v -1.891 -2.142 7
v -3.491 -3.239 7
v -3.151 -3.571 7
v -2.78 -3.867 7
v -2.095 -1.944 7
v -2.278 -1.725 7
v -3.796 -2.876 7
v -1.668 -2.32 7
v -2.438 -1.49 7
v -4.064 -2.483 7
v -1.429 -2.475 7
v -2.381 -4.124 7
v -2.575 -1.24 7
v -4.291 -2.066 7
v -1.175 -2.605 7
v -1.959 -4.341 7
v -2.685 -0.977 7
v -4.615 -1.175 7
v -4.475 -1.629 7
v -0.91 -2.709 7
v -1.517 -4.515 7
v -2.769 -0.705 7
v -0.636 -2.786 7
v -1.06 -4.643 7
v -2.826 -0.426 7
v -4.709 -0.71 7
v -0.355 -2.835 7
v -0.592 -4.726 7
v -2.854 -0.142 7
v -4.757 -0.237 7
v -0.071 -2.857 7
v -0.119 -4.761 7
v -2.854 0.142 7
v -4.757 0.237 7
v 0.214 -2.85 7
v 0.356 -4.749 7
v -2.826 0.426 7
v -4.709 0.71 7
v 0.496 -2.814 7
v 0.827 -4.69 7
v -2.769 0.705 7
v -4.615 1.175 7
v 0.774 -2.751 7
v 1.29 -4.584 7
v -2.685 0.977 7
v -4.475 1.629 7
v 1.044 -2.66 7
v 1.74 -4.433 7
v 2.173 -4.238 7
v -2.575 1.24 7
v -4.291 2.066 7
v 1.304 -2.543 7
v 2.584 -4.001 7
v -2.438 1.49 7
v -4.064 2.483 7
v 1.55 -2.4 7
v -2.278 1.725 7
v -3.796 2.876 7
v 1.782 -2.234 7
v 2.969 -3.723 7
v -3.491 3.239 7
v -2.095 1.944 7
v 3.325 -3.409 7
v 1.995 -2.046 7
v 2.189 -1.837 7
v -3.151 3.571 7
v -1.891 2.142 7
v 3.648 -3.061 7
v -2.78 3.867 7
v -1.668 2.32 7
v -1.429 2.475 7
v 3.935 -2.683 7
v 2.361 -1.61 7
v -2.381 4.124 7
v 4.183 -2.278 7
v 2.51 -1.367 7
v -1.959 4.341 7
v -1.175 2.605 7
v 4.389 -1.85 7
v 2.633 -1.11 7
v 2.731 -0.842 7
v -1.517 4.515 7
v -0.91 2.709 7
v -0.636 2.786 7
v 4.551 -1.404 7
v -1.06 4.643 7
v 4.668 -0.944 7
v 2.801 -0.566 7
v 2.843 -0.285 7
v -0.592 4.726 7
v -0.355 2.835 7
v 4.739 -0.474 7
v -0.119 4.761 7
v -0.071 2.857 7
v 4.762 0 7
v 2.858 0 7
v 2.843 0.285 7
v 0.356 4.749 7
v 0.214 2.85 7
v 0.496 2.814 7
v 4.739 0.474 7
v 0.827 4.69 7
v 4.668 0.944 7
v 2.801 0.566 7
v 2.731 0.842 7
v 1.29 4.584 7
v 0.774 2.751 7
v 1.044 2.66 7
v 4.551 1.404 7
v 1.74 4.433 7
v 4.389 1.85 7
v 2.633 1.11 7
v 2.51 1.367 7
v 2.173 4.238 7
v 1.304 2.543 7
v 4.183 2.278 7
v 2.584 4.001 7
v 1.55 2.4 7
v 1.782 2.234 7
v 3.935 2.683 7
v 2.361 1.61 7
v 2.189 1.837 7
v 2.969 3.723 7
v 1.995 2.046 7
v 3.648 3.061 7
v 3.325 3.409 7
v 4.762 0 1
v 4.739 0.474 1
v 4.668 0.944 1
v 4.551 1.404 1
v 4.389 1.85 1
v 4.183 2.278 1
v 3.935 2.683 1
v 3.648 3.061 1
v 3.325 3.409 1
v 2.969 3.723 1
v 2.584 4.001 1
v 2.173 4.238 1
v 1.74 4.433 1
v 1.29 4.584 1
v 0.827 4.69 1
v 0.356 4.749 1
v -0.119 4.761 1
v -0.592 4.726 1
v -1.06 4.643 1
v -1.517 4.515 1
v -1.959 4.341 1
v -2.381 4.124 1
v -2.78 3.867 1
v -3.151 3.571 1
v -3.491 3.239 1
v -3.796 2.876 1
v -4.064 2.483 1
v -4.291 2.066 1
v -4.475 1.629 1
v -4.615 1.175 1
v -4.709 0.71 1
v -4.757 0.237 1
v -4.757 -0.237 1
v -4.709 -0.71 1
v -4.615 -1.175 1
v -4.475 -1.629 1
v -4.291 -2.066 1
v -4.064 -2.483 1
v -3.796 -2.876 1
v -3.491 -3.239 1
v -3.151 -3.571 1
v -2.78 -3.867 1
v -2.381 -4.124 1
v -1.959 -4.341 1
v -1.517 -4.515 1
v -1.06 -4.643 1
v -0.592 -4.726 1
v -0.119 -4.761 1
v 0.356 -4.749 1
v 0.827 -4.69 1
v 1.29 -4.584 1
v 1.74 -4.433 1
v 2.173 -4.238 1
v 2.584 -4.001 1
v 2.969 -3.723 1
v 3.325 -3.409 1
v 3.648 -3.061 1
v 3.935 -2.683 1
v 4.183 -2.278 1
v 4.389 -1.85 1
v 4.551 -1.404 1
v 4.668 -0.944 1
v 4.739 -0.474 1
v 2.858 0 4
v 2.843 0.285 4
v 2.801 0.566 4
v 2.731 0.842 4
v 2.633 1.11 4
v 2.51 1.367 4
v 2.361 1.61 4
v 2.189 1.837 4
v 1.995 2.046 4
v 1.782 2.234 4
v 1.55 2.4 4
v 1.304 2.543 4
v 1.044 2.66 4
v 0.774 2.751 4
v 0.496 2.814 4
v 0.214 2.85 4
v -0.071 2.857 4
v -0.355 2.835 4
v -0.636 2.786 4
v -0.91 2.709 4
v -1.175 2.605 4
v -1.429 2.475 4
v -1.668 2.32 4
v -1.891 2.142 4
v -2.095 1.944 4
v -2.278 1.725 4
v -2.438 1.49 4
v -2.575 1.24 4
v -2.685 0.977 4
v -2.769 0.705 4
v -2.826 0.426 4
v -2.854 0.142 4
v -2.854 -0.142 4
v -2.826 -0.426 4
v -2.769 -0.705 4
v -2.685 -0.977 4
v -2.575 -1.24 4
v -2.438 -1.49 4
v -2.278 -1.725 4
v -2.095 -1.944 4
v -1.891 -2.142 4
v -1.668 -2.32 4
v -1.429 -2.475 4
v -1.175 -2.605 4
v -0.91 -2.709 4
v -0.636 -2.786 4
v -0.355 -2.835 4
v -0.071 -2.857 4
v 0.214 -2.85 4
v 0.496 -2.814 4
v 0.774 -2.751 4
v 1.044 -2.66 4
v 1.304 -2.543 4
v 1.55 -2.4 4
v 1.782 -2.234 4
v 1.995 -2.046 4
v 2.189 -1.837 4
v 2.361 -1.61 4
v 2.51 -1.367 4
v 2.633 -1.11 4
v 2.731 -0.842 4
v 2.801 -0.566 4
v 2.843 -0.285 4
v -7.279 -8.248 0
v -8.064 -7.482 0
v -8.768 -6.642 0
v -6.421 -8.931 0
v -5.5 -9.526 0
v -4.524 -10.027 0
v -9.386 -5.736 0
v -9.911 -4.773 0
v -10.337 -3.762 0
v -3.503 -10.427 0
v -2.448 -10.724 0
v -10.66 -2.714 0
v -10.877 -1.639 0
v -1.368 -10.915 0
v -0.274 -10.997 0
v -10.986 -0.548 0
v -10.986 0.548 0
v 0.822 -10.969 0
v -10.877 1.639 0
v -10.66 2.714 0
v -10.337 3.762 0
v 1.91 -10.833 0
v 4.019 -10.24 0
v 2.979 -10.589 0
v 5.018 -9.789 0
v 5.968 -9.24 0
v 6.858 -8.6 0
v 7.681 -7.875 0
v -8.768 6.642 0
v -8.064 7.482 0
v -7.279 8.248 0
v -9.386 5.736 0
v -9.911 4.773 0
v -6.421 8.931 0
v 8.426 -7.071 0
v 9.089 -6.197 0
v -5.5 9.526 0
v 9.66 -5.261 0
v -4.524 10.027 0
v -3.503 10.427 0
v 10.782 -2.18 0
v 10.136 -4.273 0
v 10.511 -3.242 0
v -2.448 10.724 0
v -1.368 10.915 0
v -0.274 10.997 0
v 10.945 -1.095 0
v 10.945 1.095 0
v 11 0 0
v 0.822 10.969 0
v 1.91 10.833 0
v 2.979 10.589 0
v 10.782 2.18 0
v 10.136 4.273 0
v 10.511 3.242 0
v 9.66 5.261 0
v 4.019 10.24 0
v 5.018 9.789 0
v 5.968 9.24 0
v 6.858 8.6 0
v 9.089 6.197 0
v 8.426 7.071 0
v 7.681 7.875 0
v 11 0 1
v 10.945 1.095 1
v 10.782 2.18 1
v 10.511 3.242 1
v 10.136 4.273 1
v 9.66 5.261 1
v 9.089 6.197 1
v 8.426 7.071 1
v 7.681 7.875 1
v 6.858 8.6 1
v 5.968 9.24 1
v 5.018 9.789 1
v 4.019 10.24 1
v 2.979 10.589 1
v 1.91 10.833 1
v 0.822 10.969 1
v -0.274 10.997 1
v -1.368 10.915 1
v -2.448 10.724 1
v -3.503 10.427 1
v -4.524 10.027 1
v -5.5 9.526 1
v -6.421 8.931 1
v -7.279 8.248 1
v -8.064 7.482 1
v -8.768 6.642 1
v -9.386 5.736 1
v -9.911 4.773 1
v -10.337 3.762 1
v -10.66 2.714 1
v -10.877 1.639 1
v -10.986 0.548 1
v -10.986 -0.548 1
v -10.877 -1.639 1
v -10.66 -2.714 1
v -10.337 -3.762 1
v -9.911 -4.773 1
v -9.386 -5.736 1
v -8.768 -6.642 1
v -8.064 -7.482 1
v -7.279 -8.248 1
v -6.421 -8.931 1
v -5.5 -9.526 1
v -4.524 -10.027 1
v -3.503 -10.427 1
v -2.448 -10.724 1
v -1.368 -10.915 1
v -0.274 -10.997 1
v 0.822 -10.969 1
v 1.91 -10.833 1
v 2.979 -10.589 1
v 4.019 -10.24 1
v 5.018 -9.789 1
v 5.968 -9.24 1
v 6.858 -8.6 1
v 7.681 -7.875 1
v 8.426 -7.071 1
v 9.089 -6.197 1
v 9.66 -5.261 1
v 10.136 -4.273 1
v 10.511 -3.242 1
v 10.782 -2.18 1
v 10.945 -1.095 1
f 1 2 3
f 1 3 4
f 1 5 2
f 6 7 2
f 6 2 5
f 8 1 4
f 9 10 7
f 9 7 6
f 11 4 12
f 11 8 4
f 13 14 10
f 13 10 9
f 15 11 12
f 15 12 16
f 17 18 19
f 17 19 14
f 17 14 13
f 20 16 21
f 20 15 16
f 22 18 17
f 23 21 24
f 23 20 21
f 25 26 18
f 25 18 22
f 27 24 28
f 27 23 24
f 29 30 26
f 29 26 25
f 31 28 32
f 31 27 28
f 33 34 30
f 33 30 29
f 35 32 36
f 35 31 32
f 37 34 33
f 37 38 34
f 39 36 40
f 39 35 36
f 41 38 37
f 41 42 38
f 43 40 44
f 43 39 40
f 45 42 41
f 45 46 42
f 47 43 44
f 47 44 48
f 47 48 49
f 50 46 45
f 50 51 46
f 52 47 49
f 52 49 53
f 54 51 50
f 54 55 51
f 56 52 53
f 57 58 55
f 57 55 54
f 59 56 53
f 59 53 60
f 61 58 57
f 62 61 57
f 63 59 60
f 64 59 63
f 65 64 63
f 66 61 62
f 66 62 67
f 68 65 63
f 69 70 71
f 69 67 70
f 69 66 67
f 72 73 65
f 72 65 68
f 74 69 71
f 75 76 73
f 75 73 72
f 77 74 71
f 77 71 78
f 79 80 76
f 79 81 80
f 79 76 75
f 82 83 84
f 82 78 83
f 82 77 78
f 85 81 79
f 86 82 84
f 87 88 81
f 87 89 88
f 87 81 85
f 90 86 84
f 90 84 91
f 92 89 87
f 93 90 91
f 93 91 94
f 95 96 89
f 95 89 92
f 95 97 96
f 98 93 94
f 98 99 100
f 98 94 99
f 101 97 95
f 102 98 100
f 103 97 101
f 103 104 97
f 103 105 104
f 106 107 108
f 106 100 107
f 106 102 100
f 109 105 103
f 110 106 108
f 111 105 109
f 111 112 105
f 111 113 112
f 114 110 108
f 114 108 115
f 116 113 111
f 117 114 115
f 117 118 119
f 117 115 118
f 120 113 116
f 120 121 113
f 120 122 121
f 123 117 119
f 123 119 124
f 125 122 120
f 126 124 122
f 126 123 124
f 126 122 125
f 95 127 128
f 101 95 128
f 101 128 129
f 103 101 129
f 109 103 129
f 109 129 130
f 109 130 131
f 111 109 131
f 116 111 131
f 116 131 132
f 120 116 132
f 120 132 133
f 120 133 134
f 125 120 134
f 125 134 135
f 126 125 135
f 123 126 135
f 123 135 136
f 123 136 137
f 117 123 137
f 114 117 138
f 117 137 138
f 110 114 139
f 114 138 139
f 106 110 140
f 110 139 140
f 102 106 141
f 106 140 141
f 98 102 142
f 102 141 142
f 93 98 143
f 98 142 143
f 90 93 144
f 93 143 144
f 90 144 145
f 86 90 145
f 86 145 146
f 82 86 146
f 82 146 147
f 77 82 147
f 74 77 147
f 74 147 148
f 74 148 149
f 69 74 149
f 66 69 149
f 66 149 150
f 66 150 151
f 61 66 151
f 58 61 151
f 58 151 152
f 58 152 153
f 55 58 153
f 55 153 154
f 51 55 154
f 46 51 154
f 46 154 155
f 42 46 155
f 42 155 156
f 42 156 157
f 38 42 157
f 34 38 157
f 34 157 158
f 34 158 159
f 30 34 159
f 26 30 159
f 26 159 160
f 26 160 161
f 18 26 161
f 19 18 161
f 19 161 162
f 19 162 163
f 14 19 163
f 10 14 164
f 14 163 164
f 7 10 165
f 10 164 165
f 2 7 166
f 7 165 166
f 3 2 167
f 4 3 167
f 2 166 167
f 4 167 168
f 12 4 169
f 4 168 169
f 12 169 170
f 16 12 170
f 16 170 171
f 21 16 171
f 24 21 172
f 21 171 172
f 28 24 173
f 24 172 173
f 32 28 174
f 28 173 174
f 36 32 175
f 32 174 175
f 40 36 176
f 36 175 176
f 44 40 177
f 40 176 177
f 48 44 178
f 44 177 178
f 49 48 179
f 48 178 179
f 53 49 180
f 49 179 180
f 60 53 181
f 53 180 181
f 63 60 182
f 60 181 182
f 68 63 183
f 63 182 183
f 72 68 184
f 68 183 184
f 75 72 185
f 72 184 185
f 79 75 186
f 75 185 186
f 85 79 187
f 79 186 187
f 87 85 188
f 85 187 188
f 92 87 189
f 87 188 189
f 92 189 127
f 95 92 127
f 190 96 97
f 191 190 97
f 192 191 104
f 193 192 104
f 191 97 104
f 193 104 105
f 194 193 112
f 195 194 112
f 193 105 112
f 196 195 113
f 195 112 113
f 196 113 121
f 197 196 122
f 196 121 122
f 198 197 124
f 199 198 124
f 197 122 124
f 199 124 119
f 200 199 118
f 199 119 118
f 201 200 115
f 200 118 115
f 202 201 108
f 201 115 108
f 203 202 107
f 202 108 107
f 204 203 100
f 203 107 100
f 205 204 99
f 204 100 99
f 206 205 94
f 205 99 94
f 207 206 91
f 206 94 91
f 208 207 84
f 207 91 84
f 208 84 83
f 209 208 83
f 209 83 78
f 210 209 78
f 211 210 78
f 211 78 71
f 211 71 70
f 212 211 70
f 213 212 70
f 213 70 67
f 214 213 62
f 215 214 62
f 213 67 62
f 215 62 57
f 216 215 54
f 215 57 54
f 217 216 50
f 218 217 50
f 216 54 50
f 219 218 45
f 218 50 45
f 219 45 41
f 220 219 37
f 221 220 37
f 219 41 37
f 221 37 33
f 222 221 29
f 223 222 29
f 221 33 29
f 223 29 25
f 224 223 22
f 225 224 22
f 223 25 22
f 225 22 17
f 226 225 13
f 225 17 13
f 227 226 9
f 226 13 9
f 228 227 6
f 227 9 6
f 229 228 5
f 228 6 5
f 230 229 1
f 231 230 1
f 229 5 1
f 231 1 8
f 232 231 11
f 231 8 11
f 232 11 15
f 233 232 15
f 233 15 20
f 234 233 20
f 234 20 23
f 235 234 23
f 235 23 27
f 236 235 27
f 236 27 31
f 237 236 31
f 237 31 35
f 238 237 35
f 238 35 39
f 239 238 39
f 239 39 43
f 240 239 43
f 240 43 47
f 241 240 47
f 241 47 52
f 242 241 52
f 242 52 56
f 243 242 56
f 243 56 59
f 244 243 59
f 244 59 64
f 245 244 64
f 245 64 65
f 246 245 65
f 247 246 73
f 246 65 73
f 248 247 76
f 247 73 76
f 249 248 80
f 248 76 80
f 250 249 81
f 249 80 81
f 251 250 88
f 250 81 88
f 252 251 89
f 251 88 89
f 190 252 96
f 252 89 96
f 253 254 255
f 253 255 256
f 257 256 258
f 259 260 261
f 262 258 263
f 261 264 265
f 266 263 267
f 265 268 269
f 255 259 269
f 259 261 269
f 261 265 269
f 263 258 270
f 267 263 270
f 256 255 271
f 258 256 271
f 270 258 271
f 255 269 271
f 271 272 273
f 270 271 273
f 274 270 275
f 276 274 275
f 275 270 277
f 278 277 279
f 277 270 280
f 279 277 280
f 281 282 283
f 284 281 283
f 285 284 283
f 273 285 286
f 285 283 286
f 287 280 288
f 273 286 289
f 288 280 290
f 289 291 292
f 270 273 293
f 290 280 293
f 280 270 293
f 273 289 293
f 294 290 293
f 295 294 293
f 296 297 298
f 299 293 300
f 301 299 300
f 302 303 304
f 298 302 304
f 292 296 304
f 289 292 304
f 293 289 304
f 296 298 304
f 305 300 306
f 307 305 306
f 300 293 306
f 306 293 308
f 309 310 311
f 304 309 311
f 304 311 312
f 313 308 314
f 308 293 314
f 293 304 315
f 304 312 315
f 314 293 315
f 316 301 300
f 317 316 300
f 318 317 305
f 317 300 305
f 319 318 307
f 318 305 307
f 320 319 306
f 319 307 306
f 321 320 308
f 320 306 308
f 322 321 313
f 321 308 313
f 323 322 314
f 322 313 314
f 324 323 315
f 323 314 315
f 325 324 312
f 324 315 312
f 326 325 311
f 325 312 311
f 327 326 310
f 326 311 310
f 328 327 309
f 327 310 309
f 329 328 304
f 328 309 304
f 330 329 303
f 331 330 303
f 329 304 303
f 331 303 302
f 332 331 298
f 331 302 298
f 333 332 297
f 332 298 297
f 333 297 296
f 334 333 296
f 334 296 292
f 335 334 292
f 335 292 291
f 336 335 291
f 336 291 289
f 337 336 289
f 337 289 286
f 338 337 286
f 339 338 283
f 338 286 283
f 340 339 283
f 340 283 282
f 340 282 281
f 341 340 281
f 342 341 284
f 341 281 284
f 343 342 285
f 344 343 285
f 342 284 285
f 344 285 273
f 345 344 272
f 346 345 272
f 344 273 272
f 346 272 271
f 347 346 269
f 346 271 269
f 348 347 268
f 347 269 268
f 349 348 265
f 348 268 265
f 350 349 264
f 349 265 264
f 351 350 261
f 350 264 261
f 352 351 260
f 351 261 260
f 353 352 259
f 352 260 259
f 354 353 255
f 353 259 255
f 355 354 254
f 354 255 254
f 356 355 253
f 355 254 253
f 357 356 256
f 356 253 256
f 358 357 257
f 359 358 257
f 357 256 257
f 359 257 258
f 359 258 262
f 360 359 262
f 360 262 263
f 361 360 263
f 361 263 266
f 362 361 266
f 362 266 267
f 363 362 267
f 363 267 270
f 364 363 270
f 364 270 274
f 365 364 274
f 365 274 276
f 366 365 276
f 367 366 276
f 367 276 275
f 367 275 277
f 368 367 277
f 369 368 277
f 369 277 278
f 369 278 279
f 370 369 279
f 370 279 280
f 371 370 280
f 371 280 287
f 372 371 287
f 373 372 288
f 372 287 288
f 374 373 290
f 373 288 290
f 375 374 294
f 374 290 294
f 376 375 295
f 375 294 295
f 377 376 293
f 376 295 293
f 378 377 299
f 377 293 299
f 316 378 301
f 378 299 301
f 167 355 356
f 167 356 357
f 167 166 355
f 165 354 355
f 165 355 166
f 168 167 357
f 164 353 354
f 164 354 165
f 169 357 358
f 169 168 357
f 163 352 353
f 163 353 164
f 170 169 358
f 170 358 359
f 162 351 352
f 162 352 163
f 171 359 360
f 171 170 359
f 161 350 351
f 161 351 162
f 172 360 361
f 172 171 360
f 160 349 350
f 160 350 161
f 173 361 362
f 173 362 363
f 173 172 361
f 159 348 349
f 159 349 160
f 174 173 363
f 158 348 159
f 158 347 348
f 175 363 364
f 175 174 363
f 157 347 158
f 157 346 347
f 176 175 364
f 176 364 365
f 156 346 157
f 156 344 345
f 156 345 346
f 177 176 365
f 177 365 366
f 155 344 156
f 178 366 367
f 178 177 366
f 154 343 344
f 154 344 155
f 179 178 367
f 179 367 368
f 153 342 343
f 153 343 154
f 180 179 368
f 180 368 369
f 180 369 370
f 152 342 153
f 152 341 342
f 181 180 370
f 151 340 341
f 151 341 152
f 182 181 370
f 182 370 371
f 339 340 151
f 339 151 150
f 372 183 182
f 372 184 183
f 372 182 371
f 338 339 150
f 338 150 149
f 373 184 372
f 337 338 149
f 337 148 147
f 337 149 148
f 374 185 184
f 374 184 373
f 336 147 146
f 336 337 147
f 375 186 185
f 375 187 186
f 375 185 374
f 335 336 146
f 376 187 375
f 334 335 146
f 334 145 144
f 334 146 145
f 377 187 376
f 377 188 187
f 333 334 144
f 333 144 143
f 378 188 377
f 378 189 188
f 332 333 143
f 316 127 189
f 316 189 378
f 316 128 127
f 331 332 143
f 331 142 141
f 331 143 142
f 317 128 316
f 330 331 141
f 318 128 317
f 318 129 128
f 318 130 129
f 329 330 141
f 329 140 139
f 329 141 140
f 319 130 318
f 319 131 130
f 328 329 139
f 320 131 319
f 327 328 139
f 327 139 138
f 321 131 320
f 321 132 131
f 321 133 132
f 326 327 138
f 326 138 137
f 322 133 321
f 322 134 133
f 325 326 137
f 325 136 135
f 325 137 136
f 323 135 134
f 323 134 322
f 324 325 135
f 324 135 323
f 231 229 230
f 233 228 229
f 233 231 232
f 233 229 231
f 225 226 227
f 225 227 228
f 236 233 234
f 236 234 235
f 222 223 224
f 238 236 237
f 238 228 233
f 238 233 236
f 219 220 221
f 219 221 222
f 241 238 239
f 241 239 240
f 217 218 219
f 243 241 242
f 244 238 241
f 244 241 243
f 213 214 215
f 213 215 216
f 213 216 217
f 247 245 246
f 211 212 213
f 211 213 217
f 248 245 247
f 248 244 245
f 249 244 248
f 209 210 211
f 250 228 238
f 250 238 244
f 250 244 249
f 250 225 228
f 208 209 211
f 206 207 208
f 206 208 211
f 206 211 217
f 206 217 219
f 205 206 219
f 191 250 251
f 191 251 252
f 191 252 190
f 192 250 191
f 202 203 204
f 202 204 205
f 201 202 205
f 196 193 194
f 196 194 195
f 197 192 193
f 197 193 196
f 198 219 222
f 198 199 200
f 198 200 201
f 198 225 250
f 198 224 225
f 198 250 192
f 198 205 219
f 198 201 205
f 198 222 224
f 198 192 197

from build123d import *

# Parameters (mm, degrees)
F0_R     = 4.7625
F0_R_2   = 2.613606
F1_DEPTH = 7
F0_R_3   = 11
F2_DEPTH = 1
F3_R     = 2.8575
F4_DEPTH = 3


with BuildPart() as f1:
    # F0 (on Top) → F1 (new body)
    with BuildSketch(Plane.XY):
        Circle(F0_R)
        Circle(F0_R_2, mode=Mode.SUBTRACT)
        Circle(F0_R_2)
    extrude(amount=F1_DEPTH)

    # F0 (on Top) → F2 (join)
    with BuildSketch(Plane.XY):
        Circle(F0_R_3)
        Circle(F0_R, mode=Mode.SUBTRACT)
    extrude(amount=F2_DEPTH)

    # F3 (on face) → F4 (cut)
    with BuildSketch(Plane.XY.offset(7)):
        Circle(F3_R)
    extrude(amount=-F4_DEPTH, mode=Mode.SUBTRACT)


solid = f1.part
